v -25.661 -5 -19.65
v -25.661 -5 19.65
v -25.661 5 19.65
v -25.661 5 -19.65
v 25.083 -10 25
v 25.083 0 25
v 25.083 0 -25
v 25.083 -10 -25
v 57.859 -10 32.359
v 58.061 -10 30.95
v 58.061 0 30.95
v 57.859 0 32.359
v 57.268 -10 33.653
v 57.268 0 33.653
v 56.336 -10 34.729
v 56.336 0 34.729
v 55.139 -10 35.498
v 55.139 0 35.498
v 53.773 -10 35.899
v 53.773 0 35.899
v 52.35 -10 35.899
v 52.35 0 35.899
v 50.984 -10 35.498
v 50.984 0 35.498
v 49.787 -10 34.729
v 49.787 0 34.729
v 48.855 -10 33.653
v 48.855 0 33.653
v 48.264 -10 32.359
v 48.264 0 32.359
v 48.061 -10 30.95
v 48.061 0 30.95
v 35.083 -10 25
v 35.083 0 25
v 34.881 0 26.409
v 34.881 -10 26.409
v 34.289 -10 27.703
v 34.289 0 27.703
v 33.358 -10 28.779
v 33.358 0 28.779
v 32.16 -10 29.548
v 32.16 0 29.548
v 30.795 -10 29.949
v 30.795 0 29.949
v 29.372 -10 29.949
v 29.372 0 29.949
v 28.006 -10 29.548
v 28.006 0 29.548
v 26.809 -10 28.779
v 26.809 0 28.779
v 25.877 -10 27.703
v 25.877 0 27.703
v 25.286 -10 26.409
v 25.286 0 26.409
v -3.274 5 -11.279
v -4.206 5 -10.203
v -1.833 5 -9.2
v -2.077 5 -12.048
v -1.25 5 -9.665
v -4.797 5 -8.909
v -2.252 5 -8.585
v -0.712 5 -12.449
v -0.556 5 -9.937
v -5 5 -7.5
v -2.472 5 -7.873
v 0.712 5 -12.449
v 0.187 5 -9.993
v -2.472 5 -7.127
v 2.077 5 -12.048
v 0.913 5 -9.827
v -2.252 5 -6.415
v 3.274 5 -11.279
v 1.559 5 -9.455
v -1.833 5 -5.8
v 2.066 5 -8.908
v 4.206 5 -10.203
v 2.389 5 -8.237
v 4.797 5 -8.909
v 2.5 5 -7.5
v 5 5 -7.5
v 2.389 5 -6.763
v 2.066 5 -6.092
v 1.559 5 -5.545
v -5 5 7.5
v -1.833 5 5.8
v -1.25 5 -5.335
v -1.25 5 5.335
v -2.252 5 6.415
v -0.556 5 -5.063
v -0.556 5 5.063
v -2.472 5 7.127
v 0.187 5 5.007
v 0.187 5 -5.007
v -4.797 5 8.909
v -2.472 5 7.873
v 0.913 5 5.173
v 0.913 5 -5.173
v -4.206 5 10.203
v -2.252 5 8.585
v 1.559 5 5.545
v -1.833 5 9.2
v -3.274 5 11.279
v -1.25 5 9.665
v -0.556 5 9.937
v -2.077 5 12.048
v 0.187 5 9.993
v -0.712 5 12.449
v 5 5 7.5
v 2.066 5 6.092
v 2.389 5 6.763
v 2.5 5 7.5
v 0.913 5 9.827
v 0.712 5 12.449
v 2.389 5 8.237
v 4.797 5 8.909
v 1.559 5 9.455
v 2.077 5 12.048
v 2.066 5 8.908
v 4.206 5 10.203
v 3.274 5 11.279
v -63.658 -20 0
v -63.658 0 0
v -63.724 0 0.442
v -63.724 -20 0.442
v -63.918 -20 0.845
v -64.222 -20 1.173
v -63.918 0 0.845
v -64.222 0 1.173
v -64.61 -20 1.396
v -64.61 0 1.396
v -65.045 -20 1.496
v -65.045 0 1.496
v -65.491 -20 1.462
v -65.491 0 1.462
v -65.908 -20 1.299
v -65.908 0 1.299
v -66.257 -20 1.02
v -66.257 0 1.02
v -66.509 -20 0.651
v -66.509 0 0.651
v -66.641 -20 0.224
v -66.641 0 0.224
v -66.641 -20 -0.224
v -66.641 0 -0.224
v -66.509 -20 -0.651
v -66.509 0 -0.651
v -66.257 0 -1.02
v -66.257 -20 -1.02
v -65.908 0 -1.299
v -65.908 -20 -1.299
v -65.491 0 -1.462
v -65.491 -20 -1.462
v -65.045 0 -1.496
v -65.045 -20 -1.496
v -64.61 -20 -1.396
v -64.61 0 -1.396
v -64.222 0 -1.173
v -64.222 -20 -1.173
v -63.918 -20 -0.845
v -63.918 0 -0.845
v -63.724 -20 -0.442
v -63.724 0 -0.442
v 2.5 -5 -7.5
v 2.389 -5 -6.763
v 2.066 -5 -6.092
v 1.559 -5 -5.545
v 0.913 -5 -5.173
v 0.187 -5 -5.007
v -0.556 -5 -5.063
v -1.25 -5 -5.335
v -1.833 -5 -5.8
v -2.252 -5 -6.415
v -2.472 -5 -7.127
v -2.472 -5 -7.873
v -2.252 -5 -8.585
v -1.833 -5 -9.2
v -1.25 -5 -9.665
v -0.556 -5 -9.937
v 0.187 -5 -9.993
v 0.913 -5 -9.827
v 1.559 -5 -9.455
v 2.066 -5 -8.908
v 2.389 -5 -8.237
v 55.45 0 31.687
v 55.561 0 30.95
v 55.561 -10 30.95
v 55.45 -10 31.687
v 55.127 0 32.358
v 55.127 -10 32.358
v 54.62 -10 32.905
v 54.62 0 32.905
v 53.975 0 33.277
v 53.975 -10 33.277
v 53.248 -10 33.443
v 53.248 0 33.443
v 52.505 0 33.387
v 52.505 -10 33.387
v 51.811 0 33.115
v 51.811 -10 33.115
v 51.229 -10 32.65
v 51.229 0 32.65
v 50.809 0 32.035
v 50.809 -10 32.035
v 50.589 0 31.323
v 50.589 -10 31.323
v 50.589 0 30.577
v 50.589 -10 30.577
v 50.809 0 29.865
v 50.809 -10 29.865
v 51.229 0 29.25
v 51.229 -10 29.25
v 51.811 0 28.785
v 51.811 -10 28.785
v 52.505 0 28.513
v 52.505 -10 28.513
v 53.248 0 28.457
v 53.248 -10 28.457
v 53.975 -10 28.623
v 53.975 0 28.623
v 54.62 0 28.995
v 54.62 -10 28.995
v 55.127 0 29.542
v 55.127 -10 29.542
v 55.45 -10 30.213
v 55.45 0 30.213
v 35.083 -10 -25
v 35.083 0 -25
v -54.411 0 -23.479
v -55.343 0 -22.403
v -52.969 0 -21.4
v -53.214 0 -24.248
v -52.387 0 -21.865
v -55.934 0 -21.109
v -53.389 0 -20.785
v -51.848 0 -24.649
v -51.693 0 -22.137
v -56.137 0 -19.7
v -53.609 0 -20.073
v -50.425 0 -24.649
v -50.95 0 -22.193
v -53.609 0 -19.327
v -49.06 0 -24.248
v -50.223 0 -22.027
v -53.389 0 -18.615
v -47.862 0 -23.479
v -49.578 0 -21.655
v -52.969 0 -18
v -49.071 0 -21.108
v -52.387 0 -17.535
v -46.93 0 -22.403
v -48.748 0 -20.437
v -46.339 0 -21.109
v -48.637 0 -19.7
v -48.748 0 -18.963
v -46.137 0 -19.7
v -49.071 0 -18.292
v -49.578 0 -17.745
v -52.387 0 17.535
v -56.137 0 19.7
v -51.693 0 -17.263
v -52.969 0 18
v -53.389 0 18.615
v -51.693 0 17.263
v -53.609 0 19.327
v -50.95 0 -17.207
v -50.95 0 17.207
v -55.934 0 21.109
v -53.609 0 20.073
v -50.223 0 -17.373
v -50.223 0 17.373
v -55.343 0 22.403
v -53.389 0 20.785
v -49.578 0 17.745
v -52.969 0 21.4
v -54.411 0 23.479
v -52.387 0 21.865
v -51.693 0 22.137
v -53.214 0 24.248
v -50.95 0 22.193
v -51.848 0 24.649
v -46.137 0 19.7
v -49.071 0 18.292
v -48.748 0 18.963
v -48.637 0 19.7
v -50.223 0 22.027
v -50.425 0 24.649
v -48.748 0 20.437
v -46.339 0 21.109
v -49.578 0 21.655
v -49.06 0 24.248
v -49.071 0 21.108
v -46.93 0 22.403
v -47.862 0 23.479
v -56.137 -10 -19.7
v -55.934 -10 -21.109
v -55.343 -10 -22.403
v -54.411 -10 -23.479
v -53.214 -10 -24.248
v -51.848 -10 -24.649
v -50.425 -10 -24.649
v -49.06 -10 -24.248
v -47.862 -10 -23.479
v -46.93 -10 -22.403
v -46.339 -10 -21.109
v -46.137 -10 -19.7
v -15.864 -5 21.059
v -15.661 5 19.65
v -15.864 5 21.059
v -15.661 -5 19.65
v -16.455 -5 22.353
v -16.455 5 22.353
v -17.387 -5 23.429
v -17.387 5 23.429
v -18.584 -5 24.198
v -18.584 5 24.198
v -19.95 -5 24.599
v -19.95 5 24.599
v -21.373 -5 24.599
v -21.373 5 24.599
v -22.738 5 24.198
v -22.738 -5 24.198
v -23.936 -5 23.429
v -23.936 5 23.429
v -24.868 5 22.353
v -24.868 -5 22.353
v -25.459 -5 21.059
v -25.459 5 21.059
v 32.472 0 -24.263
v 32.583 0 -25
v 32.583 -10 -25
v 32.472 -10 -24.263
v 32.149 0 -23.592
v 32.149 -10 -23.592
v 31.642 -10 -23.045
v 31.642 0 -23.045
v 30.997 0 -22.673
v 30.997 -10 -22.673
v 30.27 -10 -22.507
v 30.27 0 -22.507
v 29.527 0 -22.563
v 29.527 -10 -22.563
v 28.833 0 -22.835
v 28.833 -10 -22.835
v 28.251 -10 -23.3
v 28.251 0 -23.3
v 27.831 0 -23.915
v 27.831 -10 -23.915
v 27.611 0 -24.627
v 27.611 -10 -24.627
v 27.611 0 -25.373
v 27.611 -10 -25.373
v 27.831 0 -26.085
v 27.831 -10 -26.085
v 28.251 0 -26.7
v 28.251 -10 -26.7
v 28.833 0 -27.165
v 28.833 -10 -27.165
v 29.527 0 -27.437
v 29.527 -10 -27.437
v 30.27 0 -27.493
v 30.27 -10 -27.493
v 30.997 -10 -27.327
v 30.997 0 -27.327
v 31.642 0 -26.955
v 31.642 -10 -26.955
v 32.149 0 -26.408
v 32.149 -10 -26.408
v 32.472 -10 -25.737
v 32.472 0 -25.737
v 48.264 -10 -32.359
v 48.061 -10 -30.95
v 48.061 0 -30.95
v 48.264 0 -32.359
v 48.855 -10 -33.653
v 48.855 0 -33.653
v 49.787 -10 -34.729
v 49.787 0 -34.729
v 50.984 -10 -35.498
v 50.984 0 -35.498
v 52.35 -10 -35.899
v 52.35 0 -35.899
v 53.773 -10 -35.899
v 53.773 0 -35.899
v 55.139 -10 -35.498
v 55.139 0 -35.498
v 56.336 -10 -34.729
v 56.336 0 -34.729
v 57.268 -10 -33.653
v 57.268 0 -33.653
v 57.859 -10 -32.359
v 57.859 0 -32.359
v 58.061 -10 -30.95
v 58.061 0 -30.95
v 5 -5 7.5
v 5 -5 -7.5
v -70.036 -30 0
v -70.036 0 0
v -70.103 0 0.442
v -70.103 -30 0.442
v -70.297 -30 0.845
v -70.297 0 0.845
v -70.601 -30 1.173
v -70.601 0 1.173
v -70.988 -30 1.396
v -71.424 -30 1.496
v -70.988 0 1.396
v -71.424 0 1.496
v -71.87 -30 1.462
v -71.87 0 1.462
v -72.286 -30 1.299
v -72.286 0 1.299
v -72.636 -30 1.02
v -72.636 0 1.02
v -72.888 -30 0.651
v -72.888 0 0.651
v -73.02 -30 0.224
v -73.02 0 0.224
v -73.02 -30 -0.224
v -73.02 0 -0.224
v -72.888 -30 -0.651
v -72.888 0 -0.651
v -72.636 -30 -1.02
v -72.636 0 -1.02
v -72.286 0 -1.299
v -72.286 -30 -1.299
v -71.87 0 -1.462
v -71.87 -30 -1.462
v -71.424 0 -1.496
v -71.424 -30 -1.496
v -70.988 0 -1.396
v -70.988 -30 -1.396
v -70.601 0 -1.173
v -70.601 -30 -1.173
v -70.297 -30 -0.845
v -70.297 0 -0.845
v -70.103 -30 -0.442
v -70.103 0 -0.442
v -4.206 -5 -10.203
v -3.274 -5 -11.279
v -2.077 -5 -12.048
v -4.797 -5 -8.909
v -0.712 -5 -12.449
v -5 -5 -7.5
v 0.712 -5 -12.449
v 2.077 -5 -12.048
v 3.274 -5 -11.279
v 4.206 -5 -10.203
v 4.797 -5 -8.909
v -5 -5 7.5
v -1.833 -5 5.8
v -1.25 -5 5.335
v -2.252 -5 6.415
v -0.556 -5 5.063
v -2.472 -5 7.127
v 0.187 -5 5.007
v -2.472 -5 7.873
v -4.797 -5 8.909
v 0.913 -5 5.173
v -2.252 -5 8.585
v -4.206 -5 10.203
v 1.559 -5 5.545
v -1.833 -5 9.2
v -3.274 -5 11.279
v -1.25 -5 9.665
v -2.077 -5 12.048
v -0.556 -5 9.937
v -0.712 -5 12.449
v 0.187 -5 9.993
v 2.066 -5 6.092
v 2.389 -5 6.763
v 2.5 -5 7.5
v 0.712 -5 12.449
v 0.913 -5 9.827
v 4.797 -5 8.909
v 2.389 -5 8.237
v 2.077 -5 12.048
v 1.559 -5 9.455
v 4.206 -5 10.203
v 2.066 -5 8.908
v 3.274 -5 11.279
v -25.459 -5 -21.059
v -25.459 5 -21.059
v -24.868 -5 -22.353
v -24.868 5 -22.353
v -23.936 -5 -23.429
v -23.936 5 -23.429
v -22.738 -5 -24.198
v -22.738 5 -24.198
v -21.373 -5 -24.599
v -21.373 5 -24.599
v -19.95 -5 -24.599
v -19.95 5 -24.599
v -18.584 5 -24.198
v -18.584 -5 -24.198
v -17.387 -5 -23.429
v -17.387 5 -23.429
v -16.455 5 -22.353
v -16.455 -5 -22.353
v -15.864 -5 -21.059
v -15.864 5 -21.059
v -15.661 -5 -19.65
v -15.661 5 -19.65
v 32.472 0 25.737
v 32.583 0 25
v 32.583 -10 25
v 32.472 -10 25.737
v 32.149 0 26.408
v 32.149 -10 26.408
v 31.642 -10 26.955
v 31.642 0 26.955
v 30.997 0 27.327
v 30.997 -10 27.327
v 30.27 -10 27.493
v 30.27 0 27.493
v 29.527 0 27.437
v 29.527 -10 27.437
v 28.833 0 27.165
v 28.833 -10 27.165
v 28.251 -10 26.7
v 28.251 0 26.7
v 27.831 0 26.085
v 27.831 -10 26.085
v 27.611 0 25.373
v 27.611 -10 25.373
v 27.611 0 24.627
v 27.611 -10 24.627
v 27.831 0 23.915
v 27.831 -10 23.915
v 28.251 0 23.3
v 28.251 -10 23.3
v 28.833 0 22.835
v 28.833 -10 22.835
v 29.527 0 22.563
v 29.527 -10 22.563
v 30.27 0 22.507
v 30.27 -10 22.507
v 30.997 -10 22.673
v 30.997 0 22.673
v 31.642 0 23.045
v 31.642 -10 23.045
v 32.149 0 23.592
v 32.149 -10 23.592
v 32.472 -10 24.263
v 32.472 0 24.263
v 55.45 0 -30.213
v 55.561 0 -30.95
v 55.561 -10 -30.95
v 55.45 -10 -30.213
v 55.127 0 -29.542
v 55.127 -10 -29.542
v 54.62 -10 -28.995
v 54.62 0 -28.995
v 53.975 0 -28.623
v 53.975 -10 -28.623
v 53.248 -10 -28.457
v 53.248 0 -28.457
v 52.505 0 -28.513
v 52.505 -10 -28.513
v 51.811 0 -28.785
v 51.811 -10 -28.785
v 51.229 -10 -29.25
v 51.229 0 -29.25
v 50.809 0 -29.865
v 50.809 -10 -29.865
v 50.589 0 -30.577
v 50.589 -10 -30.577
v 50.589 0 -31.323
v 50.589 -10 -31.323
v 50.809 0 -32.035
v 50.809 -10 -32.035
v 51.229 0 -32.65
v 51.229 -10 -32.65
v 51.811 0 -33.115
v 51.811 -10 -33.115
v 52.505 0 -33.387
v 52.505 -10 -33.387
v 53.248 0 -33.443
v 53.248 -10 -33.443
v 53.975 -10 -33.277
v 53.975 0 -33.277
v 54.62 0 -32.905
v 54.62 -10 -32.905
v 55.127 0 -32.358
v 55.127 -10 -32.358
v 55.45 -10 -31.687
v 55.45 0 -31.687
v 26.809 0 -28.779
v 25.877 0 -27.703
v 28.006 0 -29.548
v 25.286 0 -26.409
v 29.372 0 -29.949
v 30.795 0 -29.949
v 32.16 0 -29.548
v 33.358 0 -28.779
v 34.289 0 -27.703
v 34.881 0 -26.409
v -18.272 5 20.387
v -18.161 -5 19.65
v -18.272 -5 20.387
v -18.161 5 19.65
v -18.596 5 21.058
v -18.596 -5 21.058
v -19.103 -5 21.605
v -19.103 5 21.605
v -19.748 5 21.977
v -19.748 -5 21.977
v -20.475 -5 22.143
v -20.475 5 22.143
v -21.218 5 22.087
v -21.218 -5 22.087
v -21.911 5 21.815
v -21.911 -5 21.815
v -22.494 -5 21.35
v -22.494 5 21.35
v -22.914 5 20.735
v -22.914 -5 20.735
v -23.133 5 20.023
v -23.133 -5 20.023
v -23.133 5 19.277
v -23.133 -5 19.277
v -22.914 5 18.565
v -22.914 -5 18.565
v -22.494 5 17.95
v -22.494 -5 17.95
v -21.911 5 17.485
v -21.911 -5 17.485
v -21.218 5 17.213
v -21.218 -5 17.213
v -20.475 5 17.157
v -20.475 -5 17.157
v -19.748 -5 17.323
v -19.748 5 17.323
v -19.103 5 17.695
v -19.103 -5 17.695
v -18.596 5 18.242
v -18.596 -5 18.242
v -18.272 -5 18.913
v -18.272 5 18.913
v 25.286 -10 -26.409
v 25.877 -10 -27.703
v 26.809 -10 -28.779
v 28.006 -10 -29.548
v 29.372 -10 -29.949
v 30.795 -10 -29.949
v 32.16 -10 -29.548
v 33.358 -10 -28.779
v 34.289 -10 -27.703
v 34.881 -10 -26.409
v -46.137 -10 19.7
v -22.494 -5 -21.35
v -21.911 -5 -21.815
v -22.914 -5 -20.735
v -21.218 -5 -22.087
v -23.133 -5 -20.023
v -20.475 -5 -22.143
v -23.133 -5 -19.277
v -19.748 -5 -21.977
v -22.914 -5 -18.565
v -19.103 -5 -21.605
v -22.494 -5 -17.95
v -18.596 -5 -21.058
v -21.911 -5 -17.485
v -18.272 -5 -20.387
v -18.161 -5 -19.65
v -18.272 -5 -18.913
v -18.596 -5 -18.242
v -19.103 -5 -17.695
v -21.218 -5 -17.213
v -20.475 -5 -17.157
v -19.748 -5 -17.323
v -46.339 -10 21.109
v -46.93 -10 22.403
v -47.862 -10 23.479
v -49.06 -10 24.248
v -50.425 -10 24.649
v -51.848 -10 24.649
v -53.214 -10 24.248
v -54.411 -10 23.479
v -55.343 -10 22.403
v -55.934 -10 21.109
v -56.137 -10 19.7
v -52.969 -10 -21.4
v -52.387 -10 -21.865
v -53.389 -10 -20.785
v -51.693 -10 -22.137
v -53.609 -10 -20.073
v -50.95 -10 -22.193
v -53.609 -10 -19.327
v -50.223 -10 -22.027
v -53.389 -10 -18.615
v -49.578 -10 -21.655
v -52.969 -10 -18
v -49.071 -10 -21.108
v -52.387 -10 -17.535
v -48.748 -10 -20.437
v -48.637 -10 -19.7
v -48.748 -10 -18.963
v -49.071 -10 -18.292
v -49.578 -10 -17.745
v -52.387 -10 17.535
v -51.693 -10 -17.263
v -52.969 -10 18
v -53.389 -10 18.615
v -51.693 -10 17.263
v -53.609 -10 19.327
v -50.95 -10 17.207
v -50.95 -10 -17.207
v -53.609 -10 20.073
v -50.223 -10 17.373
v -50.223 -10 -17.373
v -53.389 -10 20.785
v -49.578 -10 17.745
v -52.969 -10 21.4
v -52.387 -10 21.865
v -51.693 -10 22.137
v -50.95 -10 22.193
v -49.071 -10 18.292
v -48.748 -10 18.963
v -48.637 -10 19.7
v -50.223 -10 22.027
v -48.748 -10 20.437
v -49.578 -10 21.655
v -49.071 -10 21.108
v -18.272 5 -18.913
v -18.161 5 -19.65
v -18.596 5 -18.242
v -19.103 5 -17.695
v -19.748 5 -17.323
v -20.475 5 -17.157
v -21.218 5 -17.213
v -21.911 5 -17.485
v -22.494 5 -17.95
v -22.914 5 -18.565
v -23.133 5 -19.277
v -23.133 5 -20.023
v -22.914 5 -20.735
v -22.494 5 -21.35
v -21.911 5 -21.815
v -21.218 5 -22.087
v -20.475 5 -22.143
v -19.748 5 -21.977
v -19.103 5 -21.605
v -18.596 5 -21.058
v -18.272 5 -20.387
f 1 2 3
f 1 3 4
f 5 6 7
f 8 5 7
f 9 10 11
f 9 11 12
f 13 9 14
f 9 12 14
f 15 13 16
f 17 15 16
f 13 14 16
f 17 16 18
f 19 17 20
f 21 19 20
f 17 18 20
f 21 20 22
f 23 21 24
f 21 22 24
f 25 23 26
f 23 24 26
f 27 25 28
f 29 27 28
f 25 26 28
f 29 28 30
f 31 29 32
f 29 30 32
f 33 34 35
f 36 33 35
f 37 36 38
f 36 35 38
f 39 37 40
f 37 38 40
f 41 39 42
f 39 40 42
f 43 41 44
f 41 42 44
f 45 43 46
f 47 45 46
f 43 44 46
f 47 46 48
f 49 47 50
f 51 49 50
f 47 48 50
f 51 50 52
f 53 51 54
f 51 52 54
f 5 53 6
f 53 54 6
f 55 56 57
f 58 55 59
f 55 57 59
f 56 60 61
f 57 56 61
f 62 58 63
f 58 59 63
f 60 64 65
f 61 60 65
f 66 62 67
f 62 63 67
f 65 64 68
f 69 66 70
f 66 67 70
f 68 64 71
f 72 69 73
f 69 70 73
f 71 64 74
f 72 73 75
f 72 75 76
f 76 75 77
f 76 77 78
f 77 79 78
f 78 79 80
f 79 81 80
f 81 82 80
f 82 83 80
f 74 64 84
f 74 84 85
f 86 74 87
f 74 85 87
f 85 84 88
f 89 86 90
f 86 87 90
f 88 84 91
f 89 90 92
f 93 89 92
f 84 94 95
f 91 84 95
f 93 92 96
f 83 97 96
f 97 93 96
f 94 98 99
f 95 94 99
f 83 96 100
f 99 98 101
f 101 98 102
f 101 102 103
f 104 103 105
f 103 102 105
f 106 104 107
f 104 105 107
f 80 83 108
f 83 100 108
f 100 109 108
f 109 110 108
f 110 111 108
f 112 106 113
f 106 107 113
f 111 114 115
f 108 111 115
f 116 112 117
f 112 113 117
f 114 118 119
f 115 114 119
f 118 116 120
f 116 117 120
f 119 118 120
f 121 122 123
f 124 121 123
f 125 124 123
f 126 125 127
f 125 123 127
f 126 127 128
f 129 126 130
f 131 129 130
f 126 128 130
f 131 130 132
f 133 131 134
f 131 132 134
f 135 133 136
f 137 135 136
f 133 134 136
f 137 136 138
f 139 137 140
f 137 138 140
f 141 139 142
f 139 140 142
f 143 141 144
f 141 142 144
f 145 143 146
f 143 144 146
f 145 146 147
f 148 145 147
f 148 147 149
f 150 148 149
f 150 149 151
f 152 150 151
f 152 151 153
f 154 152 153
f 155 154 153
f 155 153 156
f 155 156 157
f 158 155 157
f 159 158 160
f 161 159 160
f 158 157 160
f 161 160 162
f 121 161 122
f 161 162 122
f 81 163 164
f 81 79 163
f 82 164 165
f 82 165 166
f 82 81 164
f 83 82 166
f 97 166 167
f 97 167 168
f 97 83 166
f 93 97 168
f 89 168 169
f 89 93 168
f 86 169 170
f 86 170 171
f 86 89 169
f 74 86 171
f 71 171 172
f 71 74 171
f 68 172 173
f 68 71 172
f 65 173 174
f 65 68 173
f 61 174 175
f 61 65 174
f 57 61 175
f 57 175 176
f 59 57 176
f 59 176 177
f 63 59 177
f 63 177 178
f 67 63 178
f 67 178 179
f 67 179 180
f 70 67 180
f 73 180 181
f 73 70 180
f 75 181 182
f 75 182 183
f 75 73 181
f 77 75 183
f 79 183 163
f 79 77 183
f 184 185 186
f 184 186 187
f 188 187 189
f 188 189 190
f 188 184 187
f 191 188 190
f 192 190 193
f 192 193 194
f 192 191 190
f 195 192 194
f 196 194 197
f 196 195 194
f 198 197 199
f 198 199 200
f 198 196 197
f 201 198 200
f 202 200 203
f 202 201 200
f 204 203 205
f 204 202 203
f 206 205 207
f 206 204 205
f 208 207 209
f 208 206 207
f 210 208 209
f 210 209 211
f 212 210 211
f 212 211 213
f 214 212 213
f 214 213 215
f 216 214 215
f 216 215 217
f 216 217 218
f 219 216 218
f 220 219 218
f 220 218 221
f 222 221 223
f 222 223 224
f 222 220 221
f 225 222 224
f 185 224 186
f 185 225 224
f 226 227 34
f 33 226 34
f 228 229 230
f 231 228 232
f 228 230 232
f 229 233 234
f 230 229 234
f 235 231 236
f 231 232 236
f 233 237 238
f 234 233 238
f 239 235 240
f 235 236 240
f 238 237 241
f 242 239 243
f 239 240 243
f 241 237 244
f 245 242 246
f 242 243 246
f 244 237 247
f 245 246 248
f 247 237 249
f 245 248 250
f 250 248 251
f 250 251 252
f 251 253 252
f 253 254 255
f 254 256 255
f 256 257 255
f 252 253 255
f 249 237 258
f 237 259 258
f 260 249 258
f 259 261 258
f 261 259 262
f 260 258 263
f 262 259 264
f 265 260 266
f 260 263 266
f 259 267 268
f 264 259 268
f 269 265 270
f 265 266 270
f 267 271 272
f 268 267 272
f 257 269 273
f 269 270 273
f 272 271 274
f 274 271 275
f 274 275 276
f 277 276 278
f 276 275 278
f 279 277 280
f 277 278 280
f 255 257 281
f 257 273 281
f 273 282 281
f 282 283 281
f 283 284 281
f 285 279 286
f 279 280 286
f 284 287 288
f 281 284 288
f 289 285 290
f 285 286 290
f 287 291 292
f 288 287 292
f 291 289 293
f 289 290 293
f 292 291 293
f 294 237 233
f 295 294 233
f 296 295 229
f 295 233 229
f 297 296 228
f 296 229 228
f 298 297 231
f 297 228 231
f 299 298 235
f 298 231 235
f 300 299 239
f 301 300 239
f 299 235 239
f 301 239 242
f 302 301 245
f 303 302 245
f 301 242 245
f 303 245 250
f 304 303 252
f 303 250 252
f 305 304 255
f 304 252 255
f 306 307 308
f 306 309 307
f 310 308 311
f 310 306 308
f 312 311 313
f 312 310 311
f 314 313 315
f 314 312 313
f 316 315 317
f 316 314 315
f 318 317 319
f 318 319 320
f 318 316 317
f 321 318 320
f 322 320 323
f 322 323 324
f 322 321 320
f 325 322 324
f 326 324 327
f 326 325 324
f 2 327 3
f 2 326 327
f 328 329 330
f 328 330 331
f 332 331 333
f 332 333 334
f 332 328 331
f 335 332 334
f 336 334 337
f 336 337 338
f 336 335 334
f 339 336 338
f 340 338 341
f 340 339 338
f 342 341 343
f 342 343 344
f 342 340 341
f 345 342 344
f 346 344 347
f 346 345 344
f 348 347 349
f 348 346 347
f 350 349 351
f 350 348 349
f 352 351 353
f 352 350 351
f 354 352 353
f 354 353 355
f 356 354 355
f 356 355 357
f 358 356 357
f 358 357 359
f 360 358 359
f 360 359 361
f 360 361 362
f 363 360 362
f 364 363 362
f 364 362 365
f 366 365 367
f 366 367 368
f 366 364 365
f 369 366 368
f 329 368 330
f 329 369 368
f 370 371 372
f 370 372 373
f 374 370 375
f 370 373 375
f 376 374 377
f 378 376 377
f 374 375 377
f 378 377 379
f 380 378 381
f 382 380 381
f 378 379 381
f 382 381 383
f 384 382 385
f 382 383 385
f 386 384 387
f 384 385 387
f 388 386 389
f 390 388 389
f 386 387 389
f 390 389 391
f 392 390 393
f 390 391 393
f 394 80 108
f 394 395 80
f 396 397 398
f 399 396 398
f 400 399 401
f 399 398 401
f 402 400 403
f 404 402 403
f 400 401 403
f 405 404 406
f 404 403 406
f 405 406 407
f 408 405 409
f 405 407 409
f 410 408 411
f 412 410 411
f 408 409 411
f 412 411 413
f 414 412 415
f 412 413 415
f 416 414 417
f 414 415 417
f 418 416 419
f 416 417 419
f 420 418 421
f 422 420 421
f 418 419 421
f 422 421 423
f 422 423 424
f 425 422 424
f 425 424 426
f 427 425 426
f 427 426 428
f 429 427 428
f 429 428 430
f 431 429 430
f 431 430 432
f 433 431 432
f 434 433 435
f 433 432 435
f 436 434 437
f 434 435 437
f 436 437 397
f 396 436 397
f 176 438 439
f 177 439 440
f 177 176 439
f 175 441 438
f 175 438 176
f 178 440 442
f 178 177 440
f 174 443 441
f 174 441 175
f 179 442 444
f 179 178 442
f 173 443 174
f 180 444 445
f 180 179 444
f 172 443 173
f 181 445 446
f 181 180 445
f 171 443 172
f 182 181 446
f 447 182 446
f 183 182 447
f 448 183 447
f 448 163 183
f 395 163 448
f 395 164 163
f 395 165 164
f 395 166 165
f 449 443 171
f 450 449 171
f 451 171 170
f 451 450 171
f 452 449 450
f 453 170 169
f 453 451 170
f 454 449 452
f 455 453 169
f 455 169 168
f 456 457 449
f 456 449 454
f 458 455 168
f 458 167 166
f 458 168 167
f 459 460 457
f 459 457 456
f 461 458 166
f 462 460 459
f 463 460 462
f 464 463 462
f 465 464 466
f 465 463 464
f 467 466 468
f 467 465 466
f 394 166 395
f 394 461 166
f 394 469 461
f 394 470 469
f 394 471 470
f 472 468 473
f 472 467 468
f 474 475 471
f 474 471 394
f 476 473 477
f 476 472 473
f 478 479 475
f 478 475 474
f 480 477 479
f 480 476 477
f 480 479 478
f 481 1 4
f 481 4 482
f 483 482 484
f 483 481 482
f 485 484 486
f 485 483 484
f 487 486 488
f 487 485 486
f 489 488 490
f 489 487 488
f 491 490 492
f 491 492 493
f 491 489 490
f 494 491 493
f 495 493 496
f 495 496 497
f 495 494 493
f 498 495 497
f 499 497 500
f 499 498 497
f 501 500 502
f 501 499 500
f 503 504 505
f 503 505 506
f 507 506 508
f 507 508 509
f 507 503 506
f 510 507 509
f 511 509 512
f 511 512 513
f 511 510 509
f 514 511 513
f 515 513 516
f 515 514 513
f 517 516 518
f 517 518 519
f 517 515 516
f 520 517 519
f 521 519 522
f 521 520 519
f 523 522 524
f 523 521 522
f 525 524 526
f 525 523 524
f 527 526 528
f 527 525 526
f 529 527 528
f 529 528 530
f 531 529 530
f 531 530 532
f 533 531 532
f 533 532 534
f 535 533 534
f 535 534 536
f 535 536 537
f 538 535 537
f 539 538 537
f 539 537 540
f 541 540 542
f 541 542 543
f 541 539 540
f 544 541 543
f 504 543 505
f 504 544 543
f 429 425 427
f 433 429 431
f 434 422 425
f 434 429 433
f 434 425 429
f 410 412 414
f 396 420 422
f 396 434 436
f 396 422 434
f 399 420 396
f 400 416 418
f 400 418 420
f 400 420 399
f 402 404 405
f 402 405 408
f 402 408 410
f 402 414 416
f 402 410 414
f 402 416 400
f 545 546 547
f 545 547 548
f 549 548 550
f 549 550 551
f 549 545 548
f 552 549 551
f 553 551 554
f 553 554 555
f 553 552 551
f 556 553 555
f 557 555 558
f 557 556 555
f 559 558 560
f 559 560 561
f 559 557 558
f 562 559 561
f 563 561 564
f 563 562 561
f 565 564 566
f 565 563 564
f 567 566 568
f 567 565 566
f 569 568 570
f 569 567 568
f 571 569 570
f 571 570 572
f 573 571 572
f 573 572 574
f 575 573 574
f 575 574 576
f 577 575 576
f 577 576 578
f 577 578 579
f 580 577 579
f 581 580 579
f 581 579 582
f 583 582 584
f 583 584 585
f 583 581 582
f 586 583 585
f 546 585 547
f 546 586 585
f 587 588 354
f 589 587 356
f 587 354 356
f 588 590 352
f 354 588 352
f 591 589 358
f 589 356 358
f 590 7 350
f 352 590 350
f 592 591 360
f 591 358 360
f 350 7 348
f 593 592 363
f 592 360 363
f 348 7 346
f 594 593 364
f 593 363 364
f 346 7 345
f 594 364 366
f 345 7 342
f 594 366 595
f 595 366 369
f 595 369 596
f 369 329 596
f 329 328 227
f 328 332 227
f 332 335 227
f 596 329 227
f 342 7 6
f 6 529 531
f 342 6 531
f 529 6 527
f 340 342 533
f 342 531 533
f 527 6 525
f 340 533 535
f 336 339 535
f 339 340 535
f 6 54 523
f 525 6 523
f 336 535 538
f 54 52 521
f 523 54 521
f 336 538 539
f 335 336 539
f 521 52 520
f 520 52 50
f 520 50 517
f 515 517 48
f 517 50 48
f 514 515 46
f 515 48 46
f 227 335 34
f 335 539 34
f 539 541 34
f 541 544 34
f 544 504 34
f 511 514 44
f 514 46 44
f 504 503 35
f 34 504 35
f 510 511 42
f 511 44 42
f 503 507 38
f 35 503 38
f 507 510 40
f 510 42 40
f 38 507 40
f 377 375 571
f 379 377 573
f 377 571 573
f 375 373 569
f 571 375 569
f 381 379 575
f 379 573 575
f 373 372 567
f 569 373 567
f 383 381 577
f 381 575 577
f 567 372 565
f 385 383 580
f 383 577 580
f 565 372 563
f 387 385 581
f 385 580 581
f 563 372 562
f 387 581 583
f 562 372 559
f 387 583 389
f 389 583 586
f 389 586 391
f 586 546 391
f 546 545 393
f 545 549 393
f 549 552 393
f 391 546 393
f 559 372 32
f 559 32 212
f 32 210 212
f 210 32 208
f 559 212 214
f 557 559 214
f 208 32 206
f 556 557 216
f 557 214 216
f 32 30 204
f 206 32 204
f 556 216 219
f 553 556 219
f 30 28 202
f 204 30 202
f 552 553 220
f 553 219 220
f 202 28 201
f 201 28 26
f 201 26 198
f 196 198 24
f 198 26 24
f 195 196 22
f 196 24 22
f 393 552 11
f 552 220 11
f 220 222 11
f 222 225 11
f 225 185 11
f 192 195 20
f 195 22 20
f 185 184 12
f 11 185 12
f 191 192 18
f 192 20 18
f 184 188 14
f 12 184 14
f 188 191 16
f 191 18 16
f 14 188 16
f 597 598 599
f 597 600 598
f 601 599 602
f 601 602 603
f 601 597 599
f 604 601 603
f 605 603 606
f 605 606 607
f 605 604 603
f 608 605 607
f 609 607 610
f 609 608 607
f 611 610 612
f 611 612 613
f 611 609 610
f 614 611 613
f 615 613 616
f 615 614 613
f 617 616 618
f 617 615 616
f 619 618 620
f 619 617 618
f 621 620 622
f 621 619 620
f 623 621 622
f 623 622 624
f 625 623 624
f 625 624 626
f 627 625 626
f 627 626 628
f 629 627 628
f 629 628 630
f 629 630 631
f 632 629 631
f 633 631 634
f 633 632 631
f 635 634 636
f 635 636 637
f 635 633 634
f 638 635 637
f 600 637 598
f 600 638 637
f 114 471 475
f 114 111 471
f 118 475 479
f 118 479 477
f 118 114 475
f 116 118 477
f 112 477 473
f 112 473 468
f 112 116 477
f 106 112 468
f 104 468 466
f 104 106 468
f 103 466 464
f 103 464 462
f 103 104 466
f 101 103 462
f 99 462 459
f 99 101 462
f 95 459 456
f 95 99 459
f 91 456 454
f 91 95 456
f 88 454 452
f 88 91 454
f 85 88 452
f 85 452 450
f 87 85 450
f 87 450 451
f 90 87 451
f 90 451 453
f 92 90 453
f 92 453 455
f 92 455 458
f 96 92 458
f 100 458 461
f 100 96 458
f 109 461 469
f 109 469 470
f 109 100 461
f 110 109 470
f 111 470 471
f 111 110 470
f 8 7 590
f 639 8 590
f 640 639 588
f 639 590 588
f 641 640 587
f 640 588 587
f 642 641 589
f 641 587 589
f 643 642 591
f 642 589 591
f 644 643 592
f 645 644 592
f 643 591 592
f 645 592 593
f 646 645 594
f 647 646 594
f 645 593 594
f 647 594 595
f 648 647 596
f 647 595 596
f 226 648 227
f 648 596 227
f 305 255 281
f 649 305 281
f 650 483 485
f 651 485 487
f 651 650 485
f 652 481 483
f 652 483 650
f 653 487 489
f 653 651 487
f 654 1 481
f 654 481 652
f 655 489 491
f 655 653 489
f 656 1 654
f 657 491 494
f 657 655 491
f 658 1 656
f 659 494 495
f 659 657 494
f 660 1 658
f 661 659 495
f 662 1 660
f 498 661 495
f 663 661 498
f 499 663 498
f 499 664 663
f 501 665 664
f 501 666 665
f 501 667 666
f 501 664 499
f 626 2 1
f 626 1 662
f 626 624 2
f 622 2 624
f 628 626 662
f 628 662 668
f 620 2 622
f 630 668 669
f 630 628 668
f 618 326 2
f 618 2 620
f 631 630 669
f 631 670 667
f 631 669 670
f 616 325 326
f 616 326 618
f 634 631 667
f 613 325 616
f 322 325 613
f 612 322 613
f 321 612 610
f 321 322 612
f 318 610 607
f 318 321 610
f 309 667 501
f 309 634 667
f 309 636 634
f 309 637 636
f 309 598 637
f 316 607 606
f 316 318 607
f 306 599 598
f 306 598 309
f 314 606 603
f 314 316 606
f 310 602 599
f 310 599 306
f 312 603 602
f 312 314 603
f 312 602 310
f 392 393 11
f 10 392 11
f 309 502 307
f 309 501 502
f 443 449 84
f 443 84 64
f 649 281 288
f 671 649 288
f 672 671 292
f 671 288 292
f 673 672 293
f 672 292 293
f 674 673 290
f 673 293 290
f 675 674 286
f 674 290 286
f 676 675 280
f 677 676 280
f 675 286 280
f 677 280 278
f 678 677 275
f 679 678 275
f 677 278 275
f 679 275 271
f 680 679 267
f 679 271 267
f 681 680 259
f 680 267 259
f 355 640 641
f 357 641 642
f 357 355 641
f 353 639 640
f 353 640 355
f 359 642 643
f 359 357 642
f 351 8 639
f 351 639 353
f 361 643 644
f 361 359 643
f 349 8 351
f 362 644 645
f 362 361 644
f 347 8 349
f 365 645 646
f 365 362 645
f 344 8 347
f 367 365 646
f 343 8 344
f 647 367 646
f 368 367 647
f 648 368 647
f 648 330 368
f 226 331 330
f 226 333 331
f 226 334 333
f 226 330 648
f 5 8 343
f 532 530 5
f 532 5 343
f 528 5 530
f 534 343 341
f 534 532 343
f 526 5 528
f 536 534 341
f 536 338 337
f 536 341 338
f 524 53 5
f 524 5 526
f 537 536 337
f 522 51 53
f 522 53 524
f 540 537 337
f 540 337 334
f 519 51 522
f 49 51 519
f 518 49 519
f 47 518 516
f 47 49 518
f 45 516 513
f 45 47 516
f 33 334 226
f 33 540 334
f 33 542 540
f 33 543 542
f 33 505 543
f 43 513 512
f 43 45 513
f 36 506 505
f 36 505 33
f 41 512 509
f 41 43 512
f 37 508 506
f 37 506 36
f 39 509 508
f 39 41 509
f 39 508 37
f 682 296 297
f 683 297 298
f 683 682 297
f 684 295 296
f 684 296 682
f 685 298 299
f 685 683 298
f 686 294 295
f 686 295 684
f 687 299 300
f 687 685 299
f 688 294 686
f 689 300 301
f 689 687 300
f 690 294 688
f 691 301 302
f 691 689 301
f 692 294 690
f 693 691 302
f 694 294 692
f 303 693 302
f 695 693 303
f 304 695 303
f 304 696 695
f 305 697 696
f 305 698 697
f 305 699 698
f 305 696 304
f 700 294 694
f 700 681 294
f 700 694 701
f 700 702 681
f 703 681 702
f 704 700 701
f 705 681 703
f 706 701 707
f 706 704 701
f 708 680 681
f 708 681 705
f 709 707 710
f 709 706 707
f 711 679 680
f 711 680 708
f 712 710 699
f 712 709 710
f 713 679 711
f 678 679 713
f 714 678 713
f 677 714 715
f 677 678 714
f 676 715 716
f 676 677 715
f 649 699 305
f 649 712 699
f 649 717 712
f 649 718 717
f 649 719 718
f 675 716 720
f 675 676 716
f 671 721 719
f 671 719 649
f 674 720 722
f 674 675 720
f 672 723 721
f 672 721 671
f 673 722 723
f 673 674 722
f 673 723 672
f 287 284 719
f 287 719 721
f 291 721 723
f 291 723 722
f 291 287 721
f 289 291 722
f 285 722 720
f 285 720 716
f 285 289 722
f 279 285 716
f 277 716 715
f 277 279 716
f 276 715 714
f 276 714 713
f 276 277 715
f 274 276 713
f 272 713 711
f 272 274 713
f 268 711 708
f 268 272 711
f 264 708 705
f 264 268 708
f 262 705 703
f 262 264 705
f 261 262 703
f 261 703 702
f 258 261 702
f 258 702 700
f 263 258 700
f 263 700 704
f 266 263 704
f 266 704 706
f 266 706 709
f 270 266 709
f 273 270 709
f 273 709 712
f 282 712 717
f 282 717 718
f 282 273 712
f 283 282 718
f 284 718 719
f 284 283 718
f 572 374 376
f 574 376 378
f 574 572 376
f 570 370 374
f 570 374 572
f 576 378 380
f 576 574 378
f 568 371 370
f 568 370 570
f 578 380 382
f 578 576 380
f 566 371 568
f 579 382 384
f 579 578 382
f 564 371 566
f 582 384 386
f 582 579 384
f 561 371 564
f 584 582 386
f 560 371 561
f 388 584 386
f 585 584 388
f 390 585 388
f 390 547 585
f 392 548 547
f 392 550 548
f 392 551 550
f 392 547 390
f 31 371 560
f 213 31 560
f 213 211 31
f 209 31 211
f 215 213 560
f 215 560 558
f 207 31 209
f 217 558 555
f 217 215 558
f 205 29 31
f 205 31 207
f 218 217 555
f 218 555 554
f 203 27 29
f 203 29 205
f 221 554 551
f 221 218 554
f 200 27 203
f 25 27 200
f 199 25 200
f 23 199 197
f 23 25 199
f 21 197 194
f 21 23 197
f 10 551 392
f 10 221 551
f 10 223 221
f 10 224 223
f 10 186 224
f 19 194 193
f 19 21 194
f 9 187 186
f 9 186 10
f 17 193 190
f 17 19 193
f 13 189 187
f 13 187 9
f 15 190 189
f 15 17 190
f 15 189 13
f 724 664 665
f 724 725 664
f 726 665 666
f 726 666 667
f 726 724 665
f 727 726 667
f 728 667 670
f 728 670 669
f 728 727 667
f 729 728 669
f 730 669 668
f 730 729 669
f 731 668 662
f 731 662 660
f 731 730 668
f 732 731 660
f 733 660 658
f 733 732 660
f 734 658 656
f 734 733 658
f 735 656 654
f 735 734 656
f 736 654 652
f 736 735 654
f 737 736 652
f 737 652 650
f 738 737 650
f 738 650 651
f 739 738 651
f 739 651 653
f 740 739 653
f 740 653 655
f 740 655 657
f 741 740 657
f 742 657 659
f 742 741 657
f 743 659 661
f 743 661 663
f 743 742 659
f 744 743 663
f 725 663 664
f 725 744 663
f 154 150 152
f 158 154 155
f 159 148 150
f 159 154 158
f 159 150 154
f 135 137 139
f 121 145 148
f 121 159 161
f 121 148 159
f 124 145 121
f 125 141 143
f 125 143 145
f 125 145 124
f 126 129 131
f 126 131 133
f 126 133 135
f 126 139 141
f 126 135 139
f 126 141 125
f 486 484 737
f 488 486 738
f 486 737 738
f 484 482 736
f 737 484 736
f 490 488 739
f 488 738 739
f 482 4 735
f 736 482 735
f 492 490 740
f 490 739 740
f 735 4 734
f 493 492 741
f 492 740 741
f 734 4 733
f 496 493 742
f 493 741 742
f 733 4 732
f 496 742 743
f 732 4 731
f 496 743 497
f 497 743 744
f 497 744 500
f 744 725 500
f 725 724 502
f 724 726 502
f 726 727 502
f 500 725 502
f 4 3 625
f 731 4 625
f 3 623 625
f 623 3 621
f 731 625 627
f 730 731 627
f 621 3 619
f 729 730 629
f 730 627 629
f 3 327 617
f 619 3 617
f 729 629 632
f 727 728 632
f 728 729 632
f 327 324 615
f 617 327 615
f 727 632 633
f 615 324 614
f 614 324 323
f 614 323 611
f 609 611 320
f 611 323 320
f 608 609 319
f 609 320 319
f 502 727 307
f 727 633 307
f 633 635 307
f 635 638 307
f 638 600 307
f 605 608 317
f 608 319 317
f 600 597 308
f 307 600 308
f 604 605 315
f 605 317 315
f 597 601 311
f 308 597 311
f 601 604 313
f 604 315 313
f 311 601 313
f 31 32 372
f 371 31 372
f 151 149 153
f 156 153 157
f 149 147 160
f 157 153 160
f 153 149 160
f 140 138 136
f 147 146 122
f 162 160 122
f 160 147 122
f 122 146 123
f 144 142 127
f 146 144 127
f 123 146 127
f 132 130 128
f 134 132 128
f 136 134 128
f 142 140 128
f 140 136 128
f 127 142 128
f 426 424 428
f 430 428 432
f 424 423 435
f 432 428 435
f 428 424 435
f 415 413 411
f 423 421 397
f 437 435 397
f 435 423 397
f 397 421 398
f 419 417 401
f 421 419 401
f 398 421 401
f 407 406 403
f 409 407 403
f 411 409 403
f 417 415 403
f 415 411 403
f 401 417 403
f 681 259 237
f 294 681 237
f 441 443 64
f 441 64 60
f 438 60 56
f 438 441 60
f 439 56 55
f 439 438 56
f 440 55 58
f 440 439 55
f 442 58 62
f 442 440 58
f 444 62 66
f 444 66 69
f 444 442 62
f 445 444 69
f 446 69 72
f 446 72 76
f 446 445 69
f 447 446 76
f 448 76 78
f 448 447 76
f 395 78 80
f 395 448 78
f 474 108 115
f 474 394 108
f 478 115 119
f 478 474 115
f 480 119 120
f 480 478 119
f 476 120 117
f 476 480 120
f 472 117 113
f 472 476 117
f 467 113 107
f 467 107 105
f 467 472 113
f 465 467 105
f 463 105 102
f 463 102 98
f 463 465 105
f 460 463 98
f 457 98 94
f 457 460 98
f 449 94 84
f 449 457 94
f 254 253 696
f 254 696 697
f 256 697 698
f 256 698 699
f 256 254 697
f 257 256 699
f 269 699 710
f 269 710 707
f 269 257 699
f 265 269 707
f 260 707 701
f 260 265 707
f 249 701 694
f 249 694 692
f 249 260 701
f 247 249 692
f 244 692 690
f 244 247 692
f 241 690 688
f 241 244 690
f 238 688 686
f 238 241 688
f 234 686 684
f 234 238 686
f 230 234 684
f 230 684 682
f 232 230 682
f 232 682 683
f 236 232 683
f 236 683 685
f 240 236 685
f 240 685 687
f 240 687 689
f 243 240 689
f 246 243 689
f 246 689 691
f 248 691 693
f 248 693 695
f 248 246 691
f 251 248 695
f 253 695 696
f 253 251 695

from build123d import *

# Parameters (mm, degrees)
F1_R      = 2.5
F2_DEPTH  = 5
F3_R      = 2.5
F4_DEPTH  = 5
F5_R      = 2.5
F6_DEPTH  = 10
F7_R      = 2.5
F8_DEPTH  = 10
F9_R      = 2.5
F10_DEPTH = 10
F11_R     = 1.5
F12_DEPTH = 20
F13_R     = 1.5
F14_DEPTH = 30


with BuildPart() as f2:
    # F1 (on Front) → F2 (new body, symmetric)
    with BuildSketch(Plane.XZ):
        with BuildLine():
            Line((5, 0), (5, 7.5))
            ThreePointArc((5, 7.5), (0, 12.5), (-5, 7.5))
            Line((-5, 7.5), (-5, 0))
            Line((-5, 0), (-5, -7.5))
            ThreePointArc((-5, -7.5), (0, -12.5), (5, -7.5))
            Line((5, -7.5), (5, 0))
        make_face()
        with Locations((0, -7.5)):
            Circle(F1_R, mode=Mode.SUBTRACT)
        with Locations((0, 7.5)):
            Circle(F1_R, mode=Mode.SUBTRACT)
    extrude(amount=F2_DEPTH, both=True)


with BuildPart() as f4:
    # F3 (on Front) → F4 (new body, symmetric)
    with BuildSketch(Plane.XZ):
        with BuildLine():
            Line((-15.6613364816, 0), (-15.6613364816, 19.65))
            ThreePointArc((-15.6613364816, 19.65), (-20.6613364816, 24.65), (-25.6613364816, 19.65))
            Line((-25.6613364816, 19.65), (-25.6613364816, 0))
            Line((-25.6613364816, 0), (-25.6613364816, -19.65))
            ThreePointArc((-25.6613364816, -19.65), (-20.6613364816, -24.65), (-15.6613364816, -19.65))
            Line((-15.6613364816, -19.65), (-15.6613364816, 0))
        make_face()
        with Locations((-20.6613364816, -19.65)):
            Circle(F3_R, mode=Mode.SUBTRACT)
        with Locations((-20.6613364816, 19.65)):
            Circle(F3_R, mode=Mode.SUBTRACT)
    extrude(amount=F4_DEPTH, both=True)


with BuildPart() as f6:
    # F5 (on Front) → F6 (new body)
    with BuildSketch(Plane.XZ):
        with BuildLine():
            Line((-46.1367060244, 0), (-46.1367060244, 19.7))
            ThreePointArc((-46.1367060244, 19.7), (-51.1367060244, 24.7), (-56.1367060244, 19.7))
            Line((-56.1367060244, 19.7), (-56.1367060244, 0))
            Line((-56.1367060244, 0), (-56.1367060244, -19.7))
            ThreePointArc((-56.1367060244, -19.7), (-51.1367060244, -24.7), (-46.1367060244, -19.7))
            Line((-46.1367060244, -19.7), (-46.1367060244, 0))
        make_face()
        with Locations((-51.1367060244, -19.7)):
            Circle(F5_R, mode=Mode.SUBTRACT)
        with Locations((-51.1367060244, 19.7)):
            Circle(F5_R, mode=Mode.SUBTRACT)
    extrude(amount=F6_DEPTH)


with BuildPart() as f8:
    # F7 (on Front) → F8 (new body)
    with BuildSketch(Plane.XZ):
        with BuildLine():
            Line((35.0832204521, 0), (35.0832204521, 25))
            ThreePointArc((35.0832204521, 25), (30.0832204521, 30), (25.0832204521, 25))
            Line((25.0832204521, 25), (25.0832204521, 0))
            Line((25.0832204521, 0), (25.0832204521, -25))
            ThreePointArc((25.0832204521, -25), (30.0832204521, -30), (35.0832204521, -25))
            Line((35.0832204521, -25), (35.0832204521, 0))
        make_face()
        with Locations((30.0832204521, -25)):
            Circle(F7_R, mode=Mode.SUBTRACT)
        with Locations((30.0832204521, 25)):
            Circle(F7_R, mode=Mode.SUBTRACT)
    extrude(amount=F8_DEPTH)


with BuildPart() as f10:
    # F9 (on Front) → F10 (new body)
    with BuildSketch(Plane.XZ):
        with BuildLine():
            Line((58.0614554882, 0), (58.0614554882, 30.95))
            ThreePointArc((58.0614554882, 30.95), (53.0614554882, 35.95), (48.0614554882, 30.95))
            Line((48.0614554882, 30.95), (48.0614554882, 0))
            Line((48.0614554882, 0), (48.0614554882, -30.95))
            ThreePointArc((48.0614554882, -30.95), (53.0614554882, -35.95), (58.0614554882, -30.95))
            Line((58.0614554882, -30.95), (58.0614554882, 0))
        make_face()
        with Locations((53.0614554882, -30.95)):
            Circle(F9_R, mode=Mode.SUBTRACT)
        with Locations((53.0614554882, 30.95)):
            Circle(F9_R, mode=Mode.SUBTRACT)
    extrude(amount=F10_DEPTH)


with BuildPart() as f12:
    # F11 (on Front) → F12 (new body)
    with BuildSketch(Plane.XZ):
        with Locations((-65.1575699449, 0)):
            Circle(F11_R)
    extrude(amount=F12_DEPTH)


with BuildPart() as f14:
    # F13 (on Front) → F14 (new body)
    with BuildSketch(Plane.XZ):
        with Locations((-71.5364515781, 0)):
            Circle(F13_R)
    extrude(amount=F14_DEPTH)


solid = Compound([f2.part, f4.part, f6.part, f8.part, f10.part, f12.part, f14.part])
